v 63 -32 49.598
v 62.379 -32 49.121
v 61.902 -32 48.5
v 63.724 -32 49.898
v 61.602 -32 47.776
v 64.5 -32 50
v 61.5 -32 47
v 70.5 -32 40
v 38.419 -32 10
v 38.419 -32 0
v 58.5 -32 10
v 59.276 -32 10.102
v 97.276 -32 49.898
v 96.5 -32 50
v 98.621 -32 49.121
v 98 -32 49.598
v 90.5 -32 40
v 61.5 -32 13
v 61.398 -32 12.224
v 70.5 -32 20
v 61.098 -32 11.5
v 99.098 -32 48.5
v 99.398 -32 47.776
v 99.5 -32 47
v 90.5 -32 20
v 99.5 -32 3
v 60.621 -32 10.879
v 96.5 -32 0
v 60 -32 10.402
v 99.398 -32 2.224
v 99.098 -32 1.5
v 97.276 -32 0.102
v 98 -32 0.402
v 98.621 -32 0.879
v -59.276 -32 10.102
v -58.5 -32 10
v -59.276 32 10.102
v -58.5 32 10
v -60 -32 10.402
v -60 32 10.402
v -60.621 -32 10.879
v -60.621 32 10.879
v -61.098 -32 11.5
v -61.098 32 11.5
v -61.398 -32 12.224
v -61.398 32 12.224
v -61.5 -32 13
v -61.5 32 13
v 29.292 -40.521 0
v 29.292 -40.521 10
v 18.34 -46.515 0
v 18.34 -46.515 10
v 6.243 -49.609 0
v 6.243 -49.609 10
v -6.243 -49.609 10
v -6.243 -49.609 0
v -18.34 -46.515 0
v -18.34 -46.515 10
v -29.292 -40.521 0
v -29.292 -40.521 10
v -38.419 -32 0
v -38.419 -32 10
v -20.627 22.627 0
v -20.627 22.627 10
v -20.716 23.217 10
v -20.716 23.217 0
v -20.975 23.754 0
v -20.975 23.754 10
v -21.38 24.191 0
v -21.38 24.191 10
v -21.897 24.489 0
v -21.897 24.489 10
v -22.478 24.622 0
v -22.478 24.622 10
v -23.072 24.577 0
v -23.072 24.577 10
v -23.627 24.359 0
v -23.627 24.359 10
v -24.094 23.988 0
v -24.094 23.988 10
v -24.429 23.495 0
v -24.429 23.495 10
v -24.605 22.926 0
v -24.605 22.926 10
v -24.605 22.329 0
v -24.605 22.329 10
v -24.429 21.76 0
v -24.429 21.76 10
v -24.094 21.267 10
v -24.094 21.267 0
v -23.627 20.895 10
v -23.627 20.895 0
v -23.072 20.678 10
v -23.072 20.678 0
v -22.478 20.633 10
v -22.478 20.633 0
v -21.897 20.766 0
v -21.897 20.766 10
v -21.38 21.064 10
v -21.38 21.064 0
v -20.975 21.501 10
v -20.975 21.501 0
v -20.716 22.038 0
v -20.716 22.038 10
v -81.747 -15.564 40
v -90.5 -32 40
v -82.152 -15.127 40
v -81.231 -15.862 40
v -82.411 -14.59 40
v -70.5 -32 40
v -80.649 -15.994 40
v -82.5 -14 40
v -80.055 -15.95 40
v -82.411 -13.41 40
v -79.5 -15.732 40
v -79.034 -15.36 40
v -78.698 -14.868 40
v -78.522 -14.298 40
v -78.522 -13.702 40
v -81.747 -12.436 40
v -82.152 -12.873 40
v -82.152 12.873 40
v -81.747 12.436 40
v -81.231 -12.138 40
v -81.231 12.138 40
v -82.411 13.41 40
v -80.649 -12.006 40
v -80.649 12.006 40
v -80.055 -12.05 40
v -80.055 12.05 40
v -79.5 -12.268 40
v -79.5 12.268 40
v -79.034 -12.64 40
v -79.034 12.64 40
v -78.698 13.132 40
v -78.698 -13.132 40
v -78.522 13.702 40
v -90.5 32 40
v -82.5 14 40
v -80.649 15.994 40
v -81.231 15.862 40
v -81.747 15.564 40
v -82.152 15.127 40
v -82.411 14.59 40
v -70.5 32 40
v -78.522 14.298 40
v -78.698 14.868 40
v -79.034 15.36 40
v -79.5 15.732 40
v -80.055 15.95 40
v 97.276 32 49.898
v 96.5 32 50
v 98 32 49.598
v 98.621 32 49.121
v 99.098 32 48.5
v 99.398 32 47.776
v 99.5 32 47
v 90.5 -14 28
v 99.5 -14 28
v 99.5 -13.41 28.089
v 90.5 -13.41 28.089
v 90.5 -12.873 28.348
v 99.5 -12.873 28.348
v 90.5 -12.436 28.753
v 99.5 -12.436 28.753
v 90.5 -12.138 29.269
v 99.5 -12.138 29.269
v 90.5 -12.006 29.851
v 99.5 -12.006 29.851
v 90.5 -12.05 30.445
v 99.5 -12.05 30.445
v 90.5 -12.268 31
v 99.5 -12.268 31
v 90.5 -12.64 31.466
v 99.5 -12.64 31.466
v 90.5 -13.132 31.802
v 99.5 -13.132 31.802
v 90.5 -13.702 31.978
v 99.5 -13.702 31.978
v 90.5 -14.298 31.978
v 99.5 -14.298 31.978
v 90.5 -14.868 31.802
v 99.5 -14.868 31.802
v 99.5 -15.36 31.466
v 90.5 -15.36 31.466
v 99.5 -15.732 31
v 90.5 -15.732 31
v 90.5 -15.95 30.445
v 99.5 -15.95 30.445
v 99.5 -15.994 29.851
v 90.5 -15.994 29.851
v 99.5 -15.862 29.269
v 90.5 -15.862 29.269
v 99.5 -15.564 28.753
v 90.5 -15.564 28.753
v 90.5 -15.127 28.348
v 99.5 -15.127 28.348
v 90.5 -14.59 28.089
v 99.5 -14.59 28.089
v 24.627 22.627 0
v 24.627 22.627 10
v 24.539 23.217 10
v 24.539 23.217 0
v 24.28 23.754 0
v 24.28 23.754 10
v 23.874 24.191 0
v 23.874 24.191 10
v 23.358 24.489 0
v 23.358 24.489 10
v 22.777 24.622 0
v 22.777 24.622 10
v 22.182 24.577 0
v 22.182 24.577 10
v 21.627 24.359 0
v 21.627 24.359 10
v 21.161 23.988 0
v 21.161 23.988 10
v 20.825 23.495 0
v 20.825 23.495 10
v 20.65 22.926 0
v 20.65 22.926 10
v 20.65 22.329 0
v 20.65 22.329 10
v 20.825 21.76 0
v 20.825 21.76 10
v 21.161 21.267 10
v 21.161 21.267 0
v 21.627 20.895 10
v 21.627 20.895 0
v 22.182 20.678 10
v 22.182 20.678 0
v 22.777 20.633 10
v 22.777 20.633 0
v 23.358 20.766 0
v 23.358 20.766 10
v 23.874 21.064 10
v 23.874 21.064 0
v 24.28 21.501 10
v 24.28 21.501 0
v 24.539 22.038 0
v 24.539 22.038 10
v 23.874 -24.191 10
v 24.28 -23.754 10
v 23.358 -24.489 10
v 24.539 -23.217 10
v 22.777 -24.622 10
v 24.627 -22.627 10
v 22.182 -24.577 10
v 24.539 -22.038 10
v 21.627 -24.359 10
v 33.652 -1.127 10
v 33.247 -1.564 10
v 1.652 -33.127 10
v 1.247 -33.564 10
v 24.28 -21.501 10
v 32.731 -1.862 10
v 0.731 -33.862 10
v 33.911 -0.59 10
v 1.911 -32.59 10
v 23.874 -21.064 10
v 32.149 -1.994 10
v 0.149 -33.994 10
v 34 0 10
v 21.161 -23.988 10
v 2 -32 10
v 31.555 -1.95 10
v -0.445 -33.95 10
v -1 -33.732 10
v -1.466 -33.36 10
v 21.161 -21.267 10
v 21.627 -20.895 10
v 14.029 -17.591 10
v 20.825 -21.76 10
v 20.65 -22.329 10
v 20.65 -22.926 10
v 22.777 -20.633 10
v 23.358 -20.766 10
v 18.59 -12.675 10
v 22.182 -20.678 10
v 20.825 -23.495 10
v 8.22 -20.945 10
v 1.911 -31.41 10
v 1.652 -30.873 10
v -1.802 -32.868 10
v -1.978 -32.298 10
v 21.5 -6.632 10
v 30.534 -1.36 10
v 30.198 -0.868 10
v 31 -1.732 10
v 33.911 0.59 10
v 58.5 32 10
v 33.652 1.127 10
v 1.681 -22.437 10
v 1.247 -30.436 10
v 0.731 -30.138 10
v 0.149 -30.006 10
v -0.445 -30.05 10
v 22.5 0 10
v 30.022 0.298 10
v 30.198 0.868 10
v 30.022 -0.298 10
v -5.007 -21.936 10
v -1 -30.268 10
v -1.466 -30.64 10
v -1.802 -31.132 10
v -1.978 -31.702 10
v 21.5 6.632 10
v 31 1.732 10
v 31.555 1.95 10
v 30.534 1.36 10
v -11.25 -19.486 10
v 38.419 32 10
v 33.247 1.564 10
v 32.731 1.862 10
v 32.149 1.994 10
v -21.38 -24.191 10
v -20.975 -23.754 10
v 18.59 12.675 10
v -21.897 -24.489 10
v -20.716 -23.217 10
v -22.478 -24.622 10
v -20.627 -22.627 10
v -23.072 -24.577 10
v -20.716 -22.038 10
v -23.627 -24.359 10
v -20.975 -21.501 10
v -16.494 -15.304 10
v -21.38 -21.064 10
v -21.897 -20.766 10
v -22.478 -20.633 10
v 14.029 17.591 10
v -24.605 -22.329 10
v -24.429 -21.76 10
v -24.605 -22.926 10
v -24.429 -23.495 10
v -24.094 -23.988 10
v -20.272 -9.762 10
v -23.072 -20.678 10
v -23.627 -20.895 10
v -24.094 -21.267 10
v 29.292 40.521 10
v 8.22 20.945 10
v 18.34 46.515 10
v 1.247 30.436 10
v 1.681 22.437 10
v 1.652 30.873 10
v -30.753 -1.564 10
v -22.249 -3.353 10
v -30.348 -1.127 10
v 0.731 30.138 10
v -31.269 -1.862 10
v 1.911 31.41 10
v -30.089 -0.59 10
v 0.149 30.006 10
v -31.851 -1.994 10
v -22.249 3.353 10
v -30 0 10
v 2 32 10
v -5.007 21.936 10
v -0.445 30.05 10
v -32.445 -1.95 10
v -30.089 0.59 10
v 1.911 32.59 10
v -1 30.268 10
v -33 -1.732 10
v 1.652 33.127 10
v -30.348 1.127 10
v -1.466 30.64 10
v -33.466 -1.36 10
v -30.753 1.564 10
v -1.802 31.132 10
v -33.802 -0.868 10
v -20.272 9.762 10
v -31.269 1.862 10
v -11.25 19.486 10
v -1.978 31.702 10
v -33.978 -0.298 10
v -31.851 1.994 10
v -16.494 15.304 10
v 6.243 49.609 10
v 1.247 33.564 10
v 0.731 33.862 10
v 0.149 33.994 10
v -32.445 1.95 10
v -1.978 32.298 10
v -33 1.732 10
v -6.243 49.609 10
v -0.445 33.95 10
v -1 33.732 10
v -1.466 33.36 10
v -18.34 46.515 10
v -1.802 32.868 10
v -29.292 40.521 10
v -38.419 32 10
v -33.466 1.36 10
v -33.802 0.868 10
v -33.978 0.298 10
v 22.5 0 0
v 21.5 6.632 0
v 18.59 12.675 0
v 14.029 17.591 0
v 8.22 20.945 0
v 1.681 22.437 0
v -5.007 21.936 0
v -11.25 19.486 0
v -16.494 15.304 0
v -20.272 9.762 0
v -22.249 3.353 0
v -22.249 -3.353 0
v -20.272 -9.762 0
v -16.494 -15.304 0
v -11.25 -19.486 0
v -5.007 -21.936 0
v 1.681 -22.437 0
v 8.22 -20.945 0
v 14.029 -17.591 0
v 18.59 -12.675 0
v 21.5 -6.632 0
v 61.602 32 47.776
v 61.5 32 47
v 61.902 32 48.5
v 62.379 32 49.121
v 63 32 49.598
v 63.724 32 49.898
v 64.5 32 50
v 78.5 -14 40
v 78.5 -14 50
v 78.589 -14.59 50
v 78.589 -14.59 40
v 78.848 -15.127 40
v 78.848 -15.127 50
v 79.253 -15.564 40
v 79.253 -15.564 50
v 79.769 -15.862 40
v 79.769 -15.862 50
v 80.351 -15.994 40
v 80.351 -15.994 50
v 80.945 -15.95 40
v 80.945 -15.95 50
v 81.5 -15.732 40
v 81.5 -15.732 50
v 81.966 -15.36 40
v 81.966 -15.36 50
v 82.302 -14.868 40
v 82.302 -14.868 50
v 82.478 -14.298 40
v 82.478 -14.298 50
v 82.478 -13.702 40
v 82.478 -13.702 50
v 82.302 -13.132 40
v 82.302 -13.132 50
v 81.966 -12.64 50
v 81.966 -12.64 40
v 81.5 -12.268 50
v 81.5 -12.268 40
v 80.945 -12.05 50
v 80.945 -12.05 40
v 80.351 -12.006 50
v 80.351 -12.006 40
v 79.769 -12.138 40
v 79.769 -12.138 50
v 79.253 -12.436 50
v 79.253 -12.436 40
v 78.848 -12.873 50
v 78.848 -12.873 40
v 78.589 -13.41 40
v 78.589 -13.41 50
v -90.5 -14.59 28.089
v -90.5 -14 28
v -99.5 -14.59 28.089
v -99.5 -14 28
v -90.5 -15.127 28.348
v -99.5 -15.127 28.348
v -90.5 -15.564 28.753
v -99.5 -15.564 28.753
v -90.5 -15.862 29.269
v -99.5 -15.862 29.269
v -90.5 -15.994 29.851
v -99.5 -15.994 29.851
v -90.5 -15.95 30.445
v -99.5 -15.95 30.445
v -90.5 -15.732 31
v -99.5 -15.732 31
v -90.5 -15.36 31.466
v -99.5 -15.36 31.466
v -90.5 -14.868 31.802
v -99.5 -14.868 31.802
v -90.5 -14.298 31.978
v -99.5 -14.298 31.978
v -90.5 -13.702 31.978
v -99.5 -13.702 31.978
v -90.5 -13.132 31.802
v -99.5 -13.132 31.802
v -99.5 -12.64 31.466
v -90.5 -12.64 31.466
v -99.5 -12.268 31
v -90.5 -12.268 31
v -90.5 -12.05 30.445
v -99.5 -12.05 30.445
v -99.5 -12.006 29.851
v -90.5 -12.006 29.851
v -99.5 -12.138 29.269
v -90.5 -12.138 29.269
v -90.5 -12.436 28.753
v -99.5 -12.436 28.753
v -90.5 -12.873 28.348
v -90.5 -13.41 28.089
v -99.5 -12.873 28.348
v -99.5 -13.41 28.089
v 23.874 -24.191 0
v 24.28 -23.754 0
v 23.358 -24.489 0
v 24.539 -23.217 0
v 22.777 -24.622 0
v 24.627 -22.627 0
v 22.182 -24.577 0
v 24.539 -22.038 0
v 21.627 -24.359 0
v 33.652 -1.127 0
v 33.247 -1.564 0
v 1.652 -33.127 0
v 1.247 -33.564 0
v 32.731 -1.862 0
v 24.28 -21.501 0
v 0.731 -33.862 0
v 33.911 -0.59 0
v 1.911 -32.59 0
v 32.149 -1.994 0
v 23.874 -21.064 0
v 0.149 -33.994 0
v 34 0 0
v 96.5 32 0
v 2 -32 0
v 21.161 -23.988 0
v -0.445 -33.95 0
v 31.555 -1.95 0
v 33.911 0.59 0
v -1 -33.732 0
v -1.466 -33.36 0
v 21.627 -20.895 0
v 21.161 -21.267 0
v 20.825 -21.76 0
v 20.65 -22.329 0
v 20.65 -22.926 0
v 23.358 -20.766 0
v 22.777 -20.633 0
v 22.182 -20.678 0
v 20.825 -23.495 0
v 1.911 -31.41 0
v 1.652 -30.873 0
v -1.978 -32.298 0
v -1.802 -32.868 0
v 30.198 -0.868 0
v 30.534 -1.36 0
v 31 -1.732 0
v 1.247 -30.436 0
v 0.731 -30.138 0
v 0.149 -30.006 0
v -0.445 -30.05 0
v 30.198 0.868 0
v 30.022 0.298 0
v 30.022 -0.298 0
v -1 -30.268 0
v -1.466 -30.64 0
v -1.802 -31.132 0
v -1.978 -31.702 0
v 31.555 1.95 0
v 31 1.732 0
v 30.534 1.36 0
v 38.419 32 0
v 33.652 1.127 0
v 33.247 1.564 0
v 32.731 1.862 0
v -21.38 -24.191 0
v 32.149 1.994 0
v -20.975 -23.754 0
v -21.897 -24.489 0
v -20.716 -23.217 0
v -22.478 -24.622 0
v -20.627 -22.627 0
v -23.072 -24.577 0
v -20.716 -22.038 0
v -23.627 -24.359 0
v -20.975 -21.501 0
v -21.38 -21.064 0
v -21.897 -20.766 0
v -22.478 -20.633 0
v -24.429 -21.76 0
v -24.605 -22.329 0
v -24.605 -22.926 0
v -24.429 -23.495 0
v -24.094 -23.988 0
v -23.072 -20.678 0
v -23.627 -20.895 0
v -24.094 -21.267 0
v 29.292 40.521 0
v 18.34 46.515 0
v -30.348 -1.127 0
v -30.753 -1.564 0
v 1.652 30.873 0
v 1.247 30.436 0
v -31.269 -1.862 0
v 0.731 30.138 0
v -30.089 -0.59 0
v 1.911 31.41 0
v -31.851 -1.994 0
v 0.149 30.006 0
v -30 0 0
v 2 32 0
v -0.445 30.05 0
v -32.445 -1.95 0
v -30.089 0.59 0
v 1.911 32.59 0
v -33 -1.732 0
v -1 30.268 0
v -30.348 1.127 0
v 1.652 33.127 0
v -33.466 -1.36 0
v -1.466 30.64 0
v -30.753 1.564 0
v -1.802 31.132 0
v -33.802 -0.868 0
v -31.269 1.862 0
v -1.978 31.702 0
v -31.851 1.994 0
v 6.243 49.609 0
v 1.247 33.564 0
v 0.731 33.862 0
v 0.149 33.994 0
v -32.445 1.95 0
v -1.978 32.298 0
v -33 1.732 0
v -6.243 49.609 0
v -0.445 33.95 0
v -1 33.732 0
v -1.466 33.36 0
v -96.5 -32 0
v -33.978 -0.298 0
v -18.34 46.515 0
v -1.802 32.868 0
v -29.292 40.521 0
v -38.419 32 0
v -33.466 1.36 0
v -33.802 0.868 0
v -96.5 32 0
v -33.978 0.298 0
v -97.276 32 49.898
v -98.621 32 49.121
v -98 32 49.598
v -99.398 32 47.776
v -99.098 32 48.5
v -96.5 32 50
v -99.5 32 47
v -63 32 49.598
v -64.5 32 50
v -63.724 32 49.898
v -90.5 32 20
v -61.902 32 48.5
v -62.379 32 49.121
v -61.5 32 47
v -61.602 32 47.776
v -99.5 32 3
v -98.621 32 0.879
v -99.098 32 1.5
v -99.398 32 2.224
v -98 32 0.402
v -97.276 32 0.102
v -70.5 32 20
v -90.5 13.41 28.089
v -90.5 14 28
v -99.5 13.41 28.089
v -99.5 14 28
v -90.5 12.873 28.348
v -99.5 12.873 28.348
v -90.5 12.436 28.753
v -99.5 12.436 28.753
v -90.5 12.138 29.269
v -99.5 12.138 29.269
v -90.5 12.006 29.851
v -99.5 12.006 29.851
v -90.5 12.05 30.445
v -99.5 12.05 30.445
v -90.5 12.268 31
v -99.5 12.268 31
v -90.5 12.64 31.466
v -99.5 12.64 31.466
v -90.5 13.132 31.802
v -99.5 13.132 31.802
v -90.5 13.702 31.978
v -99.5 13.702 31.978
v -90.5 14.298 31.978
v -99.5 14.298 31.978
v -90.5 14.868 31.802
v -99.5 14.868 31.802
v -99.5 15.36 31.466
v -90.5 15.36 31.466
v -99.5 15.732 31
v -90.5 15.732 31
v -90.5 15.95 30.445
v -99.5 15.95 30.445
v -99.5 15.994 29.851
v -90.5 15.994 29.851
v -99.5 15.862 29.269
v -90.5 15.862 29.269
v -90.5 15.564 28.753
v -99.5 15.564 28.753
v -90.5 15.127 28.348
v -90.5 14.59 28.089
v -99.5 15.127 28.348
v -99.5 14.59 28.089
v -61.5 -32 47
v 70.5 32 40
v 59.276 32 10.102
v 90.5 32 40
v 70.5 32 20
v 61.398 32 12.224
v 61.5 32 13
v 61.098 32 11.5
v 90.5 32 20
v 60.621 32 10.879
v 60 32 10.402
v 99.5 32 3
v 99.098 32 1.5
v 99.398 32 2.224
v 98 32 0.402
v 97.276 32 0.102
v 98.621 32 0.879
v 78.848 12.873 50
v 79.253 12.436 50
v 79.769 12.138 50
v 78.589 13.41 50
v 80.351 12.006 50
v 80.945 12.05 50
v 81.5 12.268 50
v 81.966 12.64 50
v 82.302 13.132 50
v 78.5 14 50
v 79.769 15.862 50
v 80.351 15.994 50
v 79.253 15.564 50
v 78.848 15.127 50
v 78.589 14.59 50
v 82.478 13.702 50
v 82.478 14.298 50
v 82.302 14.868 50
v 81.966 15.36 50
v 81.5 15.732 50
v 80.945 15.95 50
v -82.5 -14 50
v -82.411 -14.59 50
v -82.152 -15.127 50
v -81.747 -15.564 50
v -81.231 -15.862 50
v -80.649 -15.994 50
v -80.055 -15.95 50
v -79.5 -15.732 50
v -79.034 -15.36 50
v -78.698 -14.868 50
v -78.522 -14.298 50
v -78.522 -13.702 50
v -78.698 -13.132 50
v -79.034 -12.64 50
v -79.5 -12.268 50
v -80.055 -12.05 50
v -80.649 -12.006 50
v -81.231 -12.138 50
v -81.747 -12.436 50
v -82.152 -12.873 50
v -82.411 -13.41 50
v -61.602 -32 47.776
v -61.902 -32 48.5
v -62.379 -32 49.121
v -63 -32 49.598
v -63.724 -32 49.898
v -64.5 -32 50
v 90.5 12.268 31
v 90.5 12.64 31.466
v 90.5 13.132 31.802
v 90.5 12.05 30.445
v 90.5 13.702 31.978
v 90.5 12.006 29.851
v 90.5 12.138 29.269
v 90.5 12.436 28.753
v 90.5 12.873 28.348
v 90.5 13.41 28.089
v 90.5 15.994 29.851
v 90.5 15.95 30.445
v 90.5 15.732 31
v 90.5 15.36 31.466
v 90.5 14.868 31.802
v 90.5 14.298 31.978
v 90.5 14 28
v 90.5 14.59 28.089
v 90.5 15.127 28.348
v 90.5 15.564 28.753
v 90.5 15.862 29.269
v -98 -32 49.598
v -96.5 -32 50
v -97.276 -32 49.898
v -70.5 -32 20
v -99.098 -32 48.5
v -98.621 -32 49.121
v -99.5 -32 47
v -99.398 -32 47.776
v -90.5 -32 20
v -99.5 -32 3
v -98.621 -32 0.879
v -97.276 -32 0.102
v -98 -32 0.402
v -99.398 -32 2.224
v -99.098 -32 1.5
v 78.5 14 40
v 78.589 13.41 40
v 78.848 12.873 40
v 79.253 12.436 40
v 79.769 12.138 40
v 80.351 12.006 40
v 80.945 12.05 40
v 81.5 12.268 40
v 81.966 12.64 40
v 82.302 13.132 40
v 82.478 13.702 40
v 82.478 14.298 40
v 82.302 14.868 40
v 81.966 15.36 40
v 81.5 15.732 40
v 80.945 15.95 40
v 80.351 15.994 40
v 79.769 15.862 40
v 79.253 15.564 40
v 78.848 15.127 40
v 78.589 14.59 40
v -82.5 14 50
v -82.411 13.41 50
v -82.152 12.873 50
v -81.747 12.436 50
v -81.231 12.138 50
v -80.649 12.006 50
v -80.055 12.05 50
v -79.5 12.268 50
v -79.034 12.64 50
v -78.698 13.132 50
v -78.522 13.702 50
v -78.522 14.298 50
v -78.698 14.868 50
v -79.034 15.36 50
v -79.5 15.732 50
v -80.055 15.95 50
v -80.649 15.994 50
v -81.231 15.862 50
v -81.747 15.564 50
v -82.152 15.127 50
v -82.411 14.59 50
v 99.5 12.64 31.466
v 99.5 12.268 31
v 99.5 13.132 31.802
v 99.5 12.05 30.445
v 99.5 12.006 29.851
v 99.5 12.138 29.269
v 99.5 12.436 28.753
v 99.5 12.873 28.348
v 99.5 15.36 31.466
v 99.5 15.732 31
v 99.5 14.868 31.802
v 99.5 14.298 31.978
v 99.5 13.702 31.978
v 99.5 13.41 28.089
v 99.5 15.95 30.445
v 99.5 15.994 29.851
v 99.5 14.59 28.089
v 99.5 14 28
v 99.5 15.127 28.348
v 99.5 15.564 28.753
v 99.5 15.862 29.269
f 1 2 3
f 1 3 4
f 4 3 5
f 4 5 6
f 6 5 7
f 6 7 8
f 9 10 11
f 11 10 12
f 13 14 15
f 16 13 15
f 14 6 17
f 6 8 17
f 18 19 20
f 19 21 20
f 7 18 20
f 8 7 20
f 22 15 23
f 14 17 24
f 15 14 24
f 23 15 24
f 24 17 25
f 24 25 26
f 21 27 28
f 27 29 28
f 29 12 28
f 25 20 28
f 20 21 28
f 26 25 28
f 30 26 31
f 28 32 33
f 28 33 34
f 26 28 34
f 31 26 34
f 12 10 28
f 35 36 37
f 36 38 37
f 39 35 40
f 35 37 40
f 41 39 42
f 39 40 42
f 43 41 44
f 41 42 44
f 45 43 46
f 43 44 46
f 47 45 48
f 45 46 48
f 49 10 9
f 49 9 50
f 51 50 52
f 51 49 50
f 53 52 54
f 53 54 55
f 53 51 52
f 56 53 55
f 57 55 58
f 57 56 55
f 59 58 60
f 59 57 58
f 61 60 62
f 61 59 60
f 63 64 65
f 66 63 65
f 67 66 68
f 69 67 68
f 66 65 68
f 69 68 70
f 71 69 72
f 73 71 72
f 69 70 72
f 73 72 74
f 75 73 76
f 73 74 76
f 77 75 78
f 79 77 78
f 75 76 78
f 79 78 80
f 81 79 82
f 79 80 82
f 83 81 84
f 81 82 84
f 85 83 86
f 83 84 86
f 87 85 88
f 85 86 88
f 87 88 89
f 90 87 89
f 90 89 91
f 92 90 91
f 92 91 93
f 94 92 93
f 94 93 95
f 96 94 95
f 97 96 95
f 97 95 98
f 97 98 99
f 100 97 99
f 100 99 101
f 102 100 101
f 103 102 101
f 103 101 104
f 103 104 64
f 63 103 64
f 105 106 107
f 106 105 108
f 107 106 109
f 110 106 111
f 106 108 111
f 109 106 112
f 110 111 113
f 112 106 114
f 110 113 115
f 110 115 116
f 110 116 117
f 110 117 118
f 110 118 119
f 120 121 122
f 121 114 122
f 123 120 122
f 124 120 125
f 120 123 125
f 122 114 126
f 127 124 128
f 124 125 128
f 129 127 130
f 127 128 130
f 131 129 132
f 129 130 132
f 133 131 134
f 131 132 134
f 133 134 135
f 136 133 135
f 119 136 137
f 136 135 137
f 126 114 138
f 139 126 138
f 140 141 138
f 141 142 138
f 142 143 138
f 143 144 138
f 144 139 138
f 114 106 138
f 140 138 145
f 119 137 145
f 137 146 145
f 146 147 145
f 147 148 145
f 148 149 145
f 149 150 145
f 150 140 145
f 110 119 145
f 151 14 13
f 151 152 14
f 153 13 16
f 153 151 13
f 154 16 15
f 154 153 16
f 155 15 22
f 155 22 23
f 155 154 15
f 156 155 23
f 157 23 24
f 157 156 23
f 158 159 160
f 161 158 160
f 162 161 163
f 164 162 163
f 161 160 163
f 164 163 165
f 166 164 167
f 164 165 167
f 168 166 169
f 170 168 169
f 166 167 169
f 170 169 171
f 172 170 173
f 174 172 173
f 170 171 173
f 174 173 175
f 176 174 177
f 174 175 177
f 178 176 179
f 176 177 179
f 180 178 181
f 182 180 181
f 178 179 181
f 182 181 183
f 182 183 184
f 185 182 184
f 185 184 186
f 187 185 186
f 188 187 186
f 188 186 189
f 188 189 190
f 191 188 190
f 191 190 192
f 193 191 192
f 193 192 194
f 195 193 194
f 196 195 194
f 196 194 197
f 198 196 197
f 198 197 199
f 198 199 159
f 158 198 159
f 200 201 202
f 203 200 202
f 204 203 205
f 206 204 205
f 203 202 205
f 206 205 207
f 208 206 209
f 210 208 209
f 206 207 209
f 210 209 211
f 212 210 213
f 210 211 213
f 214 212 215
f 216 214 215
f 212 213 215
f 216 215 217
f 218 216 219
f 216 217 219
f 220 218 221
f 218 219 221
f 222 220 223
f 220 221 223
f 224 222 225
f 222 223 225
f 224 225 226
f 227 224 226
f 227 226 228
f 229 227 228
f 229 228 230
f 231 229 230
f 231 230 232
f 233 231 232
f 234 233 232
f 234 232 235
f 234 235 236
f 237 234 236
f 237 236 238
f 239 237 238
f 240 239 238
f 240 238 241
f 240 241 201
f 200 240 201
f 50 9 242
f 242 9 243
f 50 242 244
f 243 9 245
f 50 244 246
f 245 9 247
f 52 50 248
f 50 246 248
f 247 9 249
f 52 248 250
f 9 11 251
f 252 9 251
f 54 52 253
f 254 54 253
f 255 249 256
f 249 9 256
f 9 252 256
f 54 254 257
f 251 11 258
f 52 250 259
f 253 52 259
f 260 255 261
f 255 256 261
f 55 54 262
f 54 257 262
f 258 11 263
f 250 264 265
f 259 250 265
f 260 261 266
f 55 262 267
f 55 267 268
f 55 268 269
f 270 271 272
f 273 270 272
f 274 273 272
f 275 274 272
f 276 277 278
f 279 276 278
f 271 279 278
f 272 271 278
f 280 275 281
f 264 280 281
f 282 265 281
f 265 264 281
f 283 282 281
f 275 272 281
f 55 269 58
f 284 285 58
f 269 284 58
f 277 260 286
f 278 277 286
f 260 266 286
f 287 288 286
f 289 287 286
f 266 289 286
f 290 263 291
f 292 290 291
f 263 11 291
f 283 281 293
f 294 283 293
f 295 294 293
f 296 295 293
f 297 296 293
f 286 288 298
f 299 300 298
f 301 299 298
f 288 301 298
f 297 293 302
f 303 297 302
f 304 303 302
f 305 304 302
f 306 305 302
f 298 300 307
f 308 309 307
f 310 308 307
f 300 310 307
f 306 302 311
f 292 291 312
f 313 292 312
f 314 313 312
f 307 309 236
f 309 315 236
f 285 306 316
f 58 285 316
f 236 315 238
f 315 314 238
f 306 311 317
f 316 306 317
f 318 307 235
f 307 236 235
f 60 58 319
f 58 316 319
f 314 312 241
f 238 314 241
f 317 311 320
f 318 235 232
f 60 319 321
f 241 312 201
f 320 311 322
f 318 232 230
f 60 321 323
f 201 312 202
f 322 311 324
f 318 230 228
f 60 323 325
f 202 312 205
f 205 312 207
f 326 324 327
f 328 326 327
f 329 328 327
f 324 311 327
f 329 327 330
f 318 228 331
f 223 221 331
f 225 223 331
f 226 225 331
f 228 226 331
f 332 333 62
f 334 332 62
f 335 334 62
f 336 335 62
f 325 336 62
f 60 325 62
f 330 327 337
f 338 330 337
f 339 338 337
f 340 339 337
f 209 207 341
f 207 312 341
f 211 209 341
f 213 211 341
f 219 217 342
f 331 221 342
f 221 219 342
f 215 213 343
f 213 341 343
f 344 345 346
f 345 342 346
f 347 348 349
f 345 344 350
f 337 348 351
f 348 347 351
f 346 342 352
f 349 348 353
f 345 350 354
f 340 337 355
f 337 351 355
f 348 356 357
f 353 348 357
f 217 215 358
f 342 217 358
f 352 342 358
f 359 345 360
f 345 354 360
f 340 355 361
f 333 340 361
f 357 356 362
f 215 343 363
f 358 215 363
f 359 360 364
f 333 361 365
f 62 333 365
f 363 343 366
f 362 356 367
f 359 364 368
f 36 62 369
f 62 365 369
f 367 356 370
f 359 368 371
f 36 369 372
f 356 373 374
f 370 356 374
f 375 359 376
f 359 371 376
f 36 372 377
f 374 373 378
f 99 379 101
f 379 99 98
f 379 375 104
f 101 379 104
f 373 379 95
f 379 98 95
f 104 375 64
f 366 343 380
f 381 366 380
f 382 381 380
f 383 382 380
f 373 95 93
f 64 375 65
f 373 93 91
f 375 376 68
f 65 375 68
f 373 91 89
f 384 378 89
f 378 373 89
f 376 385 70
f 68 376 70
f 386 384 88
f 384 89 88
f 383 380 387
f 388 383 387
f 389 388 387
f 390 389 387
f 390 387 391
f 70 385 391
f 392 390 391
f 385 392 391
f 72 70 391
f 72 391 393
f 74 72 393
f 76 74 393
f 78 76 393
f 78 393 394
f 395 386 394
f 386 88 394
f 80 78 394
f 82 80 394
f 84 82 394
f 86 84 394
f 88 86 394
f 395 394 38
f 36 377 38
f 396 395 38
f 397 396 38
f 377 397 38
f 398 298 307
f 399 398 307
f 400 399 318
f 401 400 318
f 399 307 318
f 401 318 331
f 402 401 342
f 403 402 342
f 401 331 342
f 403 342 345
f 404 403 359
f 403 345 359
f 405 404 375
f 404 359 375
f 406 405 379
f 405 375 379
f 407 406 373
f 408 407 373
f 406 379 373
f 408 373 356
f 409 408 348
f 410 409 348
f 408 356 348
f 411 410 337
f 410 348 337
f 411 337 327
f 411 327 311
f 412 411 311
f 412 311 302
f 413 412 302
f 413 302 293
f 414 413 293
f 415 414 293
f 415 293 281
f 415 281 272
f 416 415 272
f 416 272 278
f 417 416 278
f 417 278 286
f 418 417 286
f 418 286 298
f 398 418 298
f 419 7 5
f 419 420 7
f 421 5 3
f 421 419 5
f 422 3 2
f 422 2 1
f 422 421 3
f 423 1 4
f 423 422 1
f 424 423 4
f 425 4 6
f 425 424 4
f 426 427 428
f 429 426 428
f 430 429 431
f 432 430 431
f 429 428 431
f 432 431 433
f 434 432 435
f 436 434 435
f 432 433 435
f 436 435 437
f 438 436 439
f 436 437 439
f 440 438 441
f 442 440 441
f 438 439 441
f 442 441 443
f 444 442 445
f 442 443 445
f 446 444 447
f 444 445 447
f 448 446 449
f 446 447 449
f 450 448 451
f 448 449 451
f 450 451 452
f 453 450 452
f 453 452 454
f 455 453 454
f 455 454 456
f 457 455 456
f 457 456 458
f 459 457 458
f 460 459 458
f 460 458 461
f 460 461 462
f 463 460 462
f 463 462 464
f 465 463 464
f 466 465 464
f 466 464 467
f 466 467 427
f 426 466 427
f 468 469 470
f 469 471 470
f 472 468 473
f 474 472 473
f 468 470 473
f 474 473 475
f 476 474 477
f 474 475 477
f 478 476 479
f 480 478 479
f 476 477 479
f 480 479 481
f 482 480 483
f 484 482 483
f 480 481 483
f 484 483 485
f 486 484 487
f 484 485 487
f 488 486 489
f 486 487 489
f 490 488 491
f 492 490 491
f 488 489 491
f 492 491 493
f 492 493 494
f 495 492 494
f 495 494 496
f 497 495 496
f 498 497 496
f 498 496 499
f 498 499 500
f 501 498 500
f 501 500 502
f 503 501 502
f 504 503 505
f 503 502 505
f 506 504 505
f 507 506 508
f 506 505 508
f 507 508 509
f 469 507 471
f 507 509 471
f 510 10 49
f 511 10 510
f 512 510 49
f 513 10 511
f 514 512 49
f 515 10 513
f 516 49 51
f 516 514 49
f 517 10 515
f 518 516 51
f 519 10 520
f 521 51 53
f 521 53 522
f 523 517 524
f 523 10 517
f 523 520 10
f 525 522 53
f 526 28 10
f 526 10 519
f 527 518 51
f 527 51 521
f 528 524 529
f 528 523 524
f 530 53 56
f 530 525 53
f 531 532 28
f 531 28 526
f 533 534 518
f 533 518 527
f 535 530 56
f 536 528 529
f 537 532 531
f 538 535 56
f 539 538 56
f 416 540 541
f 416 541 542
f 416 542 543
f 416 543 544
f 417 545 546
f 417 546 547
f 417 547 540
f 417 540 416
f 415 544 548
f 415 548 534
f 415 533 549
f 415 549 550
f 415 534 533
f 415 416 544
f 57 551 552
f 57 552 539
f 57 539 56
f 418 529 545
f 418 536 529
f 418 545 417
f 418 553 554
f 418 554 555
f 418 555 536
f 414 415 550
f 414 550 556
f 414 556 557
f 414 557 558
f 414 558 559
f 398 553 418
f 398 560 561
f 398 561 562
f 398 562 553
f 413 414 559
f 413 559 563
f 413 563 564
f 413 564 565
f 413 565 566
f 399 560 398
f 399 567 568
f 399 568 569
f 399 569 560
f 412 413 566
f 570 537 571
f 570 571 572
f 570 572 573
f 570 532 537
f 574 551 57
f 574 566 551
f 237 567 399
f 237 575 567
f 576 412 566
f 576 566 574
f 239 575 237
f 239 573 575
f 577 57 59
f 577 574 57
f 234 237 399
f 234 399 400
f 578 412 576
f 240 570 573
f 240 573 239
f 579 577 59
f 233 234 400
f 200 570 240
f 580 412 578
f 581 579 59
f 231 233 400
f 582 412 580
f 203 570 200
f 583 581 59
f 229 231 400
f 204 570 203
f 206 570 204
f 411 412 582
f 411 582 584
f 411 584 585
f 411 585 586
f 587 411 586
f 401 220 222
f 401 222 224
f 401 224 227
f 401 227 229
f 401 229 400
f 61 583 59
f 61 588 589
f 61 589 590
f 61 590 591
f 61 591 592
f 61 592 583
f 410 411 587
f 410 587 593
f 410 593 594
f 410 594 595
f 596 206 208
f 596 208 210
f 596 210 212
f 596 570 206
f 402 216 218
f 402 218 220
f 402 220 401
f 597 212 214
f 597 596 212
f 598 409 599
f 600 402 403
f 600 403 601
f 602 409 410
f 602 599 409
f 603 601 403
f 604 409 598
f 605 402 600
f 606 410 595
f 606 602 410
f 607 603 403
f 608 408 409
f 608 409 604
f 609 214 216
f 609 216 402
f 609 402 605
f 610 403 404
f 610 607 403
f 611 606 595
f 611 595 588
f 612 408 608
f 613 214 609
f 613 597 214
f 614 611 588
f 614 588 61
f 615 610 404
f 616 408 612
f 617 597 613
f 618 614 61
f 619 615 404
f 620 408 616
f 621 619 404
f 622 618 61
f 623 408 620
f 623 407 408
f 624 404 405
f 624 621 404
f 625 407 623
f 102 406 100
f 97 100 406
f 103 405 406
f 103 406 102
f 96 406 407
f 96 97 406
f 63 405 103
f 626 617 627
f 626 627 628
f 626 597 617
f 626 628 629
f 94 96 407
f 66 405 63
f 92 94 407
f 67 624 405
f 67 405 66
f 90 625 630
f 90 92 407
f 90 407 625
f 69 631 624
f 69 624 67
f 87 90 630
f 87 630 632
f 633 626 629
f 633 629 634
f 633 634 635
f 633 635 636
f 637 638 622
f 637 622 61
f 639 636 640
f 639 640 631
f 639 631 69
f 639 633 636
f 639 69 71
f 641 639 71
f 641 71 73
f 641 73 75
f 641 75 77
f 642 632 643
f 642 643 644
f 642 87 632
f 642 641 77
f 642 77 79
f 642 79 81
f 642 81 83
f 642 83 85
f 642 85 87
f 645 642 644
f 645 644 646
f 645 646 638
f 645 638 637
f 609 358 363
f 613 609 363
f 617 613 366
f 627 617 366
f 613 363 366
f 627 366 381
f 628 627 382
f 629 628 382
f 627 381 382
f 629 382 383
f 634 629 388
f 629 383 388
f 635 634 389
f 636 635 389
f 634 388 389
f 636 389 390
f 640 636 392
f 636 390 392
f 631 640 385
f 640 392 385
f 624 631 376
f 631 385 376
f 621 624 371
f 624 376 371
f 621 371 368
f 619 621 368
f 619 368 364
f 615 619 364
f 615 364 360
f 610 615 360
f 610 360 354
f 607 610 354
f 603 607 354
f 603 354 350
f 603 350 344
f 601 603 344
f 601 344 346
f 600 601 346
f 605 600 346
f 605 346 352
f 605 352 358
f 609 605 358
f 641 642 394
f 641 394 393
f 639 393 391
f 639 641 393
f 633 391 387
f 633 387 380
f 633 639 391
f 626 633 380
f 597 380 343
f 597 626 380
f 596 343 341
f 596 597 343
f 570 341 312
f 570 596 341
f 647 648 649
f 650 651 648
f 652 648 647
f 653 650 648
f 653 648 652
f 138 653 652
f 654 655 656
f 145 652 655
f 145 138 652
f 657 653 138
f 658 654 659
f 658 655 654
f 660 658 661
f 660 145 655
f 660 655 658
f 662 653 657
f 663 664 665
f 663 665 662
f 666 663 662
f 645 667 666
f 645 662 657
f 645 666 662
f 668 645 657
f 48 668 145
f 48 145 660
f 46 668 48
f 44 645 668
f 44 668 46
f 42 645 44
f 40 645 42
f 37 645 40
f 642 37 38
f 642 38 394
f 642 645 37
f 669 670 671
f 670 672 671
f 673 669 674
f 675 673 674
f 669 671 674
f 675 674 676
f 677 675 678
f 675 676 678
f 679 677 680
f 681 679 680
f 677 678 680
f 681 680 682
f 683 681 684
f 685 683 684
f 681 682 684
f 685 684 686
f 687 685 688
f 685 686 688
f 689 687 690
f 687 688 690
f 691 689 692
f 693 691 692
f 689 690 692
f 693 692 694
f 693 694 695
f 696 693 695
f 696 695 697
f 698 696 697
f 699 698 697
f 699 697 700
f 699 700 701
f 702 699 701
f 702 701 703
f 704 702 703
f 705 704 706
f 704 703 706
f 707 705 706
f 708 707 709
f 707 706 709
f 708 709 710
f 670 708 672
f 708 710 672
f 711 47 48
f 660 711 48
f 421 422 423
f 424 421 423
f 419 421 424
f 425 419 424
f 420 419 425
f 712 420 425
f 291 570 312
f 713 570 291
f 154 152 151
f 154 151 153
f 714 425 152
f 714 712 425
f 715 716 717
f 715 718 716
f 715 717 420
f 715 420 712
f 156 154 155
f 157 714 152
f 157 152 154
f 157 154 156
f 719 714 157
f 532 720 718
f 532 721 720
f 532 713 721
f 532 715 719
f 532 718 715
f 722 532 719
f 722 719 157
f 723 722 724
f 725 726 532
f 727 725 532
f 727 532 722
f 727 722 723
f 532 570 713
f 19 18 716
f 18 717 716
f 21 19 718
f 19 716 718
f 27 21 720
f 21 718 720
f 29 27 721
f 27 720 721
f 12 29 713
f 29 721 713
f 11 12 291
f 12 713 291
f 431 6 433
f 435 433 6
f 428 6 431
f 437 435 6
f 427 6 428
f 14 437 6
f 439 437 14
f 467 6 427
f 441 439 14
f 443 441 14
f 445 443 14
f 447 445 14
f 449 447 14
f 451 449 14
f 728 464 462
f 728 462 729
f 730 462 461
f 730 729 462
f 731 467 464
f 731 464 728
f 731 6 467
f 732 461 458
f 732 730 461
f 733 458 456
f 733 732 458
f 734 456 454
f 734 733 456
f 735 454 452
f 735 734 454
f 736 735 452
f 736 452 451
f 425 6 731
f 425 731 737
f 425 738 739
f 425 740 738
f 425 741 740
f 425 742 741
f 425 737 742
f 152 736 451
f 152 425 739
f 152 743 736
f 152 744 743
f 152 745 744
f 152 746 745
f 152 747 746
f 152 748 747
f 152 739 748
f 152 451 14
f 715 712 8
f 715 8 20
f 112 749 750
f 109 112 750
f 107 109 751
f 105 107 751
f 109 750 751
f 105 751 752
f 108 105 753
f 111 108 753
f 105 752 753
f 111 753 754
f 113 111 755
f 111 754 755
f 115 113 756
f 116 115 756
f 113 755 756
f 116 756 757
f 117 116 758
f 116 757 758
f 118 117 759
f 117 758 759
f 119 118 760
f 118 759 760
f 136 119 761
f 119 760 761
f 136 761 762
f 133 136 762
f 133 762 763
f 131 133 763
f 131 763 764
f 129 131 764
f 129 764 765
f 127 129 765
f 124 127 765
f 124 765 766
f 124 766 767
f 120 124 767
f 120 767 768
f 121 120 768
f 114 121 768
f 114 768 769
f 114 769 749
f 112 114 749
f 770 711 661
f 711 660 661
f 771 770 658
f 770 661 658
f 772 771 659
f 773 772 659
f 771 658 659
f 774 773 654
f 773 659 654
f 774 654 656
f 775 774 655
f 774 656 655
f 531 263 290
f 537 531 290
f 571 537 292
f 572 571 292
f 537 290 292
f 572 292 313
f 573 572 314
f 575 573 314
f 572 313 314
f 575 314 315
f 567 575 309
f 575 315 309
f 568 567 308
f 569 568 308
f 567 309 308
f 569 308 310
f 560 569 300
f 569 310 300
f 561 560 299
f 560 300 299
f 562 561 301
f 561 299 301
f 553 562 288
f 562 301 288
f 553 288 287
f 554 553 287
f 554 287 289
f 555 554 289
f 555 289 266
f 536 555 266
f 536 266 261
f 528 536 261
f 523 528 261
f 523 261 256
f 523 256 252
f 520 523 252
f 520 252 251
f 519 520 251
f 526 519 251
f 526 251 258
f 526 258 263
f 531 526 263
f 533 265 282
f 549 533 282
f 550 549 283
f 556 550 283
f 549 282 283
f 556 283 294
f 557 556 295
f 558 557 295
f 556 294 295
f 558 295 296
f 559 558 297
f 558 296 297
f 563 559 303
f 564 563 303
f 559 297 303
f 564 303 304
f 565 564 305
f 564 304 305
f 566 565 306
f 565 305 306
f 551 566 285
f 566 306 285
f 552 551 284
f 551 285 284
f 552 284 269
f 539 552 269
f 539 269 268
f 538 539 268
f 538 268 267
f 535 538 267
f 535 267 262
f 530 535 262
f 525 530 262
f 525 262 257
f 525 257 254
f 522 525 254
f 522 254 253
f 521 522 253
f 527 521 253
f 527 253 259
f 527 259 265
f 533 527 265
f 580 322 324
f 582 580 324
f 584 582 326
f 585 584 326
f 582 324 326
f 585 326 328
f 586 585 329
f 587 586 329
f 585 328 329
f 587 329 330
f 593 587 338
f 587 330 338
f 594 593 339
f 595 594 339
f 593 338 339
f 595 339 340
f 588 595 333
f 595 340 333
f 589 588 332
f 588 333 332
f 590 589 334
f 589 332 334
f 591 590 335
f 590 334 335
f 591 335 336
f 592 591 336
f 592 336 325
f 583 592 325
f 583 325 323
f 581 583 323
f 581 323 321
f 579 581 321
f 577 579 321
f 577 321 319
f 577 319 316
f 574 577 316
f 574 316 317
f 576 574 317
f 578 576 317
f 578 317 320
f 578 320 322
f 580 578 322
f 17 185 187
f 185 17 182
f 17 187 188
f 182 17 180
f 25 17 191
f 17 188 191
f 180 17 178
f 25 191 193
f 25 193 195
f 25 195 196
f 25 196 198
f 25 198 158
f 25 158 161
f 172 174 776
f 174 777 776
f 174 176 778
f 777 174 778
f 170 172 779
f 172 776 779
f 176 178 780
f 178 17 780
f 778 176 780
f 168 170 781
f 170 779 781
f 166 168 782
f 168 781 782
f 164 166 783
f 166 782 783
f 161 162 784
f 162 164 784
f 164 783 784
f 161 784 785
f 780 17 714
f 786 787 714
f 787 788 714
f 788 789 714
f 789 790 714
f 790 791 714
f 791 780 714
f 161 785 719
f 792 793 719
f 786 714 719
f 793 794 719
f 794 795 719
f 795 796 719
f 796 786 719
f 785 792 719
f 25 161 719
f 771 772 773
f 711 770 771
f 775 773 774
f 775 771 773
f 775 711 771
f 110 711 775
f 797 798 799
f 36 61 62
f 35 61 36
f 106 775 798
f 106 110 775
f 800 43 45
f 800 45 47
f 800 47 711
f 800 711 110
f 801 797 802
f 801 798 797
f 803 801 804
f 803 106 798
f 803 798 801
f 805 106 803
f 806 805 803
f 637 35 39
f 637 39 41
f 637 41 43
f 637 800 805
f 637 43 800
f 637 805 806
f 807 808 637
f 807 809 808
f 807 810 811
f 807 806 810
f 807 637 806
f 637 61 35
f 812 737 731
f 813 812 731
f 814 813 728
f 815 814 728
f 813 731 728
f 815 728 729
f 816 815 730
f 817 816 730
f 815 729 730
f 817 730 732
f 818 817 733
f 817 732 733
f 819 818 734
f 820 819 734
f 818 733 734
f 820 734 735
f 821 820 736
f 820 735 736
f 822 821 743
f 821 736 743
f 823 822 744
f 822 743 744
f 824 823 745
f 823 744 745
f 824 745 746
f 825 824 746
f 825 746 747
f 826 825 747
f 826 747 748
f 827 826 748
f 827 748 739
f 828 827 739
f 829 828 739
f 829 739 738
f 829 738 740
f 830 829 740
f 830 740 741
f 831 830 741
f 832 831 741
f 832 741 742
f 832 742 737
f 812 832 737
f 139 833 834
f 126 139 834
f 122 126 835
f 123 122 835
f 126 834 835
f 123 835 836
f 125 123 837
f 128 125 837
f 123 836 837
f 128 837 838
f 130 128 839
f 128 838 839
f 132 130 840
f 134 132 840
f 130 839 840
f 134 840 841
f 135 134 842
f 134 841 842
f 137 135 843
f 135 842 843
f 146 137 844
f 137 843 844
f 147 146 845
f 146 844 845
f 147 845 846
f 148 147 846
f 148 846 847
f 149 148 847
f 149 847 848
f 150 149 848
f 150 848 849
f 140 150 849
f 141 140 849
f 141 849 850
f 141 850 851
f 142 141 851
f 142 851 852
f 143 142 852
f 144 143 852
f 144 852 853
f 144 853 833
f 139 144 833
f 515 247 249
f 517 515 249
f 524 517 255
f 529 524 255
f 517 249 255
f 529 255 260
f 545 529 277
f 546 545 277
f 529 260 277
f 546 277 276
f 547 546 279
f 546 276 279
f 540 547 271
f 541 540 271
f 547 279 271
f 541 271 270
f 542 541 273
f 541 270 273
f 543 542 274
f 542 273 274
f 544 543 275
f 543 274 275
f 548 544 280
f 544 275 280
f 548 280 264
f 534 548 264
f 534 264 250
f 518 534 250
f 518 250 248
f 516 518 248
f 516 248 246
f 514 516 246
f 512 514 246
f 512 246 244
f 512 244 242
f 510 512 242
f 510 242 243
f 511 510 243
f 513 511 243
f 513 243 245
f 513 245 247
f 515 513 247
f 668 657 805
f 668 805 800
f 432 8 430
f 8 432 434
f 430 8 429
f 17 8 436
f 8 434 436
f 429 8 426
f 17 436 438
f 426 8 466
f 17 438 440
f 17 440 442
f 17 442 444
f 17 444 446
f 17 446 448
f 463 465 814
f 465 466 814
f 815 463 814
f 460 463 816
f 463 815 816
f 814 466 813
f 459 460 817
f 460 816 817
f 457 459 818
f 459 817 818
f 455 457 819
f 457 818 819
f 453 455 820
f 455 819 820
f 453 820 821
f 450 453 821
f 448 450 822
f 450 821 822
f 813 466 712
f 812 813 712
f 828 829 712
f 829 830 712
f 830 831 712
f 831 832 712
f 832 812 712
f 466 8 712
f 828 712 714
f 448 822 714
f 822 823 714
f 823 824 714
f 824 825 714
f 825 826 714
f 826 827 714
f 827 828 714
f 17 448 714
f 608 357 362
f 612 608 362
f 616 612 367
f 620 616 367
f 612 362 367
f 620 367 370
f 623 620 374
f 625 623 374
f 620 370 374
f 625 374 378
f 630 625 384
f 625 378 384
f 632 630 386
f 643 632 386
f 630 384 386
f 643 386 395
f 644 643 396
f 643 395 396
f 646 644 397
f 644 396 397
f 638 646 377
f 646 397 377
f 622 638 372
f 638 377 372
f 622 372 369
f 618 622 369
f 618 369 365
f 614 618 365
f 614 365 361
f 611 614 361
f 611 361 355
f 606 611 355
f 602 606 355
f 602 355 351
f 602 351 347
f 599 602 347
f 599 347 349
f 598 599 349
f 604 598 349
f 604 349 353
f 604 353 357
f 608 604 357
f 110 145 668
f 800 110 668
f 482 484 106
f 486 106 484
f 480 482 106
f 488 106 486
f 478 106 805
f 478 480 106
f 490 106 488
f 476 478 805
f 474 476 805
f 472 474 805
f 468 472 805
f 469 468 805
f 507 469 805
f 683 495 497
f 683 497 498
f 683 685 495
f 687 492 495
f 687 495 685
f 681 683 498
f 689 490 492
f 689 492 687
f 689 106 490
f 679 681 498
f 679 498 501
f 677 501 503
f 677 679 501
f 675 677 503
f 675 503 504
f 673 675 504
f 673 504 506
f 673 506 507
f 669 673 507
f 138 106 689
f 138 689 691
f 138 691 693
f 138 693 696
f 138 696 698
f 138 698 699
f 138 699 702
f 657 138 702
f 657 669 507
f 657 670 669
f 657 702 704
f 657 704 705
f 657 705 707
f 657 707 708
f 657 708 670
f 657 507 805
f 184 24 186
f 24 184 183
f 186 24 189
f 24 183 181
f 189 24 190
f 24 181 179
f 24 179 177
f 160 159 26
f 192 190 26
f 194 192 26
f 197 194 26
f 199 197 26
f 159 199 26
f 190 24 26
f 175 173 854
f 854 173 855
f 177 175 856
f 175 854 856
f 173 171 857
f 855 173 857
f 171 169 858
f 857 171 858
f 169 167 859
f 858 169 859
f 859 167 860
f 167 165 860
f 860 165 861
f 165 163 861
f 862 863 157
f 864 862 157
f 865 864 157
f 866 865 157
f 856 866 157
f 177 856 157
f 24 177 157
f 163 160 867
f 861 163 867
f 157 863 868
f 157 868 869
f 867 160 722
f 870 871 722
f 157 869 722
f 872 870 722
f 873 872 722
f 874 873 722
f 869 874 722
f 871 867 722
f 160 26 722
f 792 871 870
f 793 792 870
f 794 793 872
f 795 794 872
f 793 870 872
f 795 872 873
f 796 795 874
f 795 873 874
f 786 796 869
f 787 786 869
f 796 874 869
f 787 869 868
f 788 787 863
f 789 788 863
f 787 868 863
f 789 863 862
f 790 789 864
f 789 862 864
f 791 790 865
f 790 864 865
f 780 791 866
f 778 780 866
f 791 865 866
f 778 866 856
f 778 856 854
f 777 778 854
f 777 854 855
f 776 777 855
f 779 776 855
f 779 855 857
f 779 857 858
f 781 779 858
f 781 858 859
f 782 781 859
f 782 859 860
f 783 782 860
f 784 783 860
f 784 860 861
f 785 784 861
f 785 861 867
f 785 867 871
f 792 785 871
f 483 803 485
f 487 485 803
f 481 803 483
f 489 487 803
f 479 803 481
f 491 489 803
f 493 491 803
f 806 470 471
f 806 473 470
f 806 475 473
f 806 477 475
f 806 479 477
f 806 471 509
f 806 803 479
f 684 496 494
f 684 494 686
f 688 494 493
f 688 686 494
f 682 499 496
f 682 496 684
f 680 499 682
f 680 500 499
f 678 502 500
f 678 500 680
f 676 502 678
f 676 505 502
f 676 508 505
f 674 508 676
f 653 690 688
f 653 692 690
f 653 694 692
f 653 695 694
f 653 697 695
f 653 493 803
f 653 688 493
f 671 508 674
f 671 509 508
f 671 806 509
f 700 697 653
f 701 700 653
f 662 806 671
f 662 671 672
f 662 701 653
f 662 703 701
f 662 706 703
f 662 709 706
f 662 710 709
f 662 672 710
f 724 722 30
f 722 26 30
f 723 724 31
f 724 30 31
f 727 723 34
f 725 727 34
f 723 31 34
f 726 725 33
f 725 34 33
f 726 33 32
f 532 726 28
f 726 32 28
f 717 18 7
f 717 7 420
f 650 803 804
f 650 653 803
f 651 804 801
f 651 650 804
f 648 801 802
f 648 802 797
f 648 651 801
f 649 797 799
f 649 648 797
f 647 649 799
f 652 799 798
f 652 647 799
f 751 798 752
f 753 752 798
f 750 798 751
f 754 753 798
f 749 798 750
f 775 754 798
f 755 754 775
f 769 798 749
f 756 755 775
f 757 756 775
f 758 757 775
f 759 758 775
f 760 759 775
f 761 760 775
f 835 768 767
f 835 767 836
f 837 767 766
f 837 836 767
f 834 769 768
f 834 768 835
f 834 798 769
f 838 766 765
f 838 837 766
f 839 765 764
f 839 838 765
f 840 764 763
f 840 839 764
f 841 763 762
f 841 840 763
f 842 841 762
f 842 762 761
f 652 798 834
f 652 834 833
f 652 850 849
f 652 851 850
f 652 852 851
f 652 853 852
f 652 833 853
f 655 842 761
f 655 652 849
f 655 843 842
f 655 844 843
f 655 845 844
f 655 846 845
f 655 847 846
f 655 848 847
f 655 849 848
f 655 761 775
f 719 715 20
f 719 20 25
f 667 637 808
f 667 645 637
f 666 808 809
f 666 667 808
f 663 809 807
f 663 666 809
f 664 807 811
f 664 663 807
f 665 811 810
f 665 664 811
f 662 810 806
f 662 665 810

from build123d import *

# Parameters (mm, degrees)
BOSS_EXTRUDE1_DEPTH            = 10
SKETCH2_R                      = 22.5
CUT_EXTRUDE1_DEPTH             = 112.804516903
SKETCH3_R                      = 2
CUT_EXTRUDE2_DEPTH             = 112.804516903
SKETCH5_W                      = 38
SKETCH5_H                      = 64
BOSS_EXTRUDE2_DEPTH            = 40
SKETCH6_W                      = 20
SKETCH6_H                      = 20
CUT_EXTRUDE3_DEPTH             = 139.290455202
CUT_EXTRUDE4_REACH             = 124.067
SKETCH8_R                      = 2
CUT_EXTRUDE4_DIRECTION_2_DEPTH = 123.066580193
CUT_EXTRUDE5_REACH             = 213.189
SKETCH9_R                      = 2
CUT_EXTRUDE6_REACH             = 213.189
SKETCH10_R                     = 2
FILLET1_R                      = 3
FILLET2_R                      = 3
FILLET3_R                      = 3


with BuildPart() as part:
    # Sketch1 → Boss-Extrude1 (new body)
    with BuildSketch(Plane.XY):
        with BuildLine():
            Line((38.418745425, 32), (99.5, 32))
            Line((99.5, 32), (99.5, -32))
            Line((99.5, -32), (38.418745425, -32))
            ThreePointArc((38.418745425, -32), (0, -50), (-38.418745425, -32))
            Line((-38.418745425, -32), (-99.5, -32))
            Line((-99.5, -32), (-99.5, 32))
            Line((-99.5, 32), (-38.418745425, 32))
            ThreePointArc((-38.418745425, 32), (0, 50), (38.418745425, 32))
        make_face()
    extrude(amount=BOSS_EXTRUDE1_DEPTH)

    # Sketch2 → Cut-Extrude1 (cut, through all)
    with BuildSketch(Plane.XY.offset(10)):
        Circle(SKETCH2_R)
    extrude(amount=-CUT_EXTRUDE1_DEPTH, mode=Mode.SUBTRACT)

    # Sketch3 → Cut-Extrude2 (cut, through all)
    with BuildSketch(Plane.XY.offset(10)):
        with Locations((32, 0)):
            Circle(SKETCH3_R)
        with Locations((22.627416998, -22.627416998)):
            Circle(SKETCH3_R)
        with Locations((0, -32)):
            Circle(SKETCH3_R)
        with Locations((-22.627416998, -22.627416998)):
            Circle(SKETCH3_R)
        with Locations((-32, 0)):
            Circle(SKETCH3_R)
        with Locations((-22.627416998, 22.627416998)):
            Circle(SKETCH3_R)
        with Locations((0, 32)):
            Circle(SKETCH3_R)
        with Locations((22.627416998, 22.627416998)):
            Circle(SKETCH3_R)
    extrude(amount=-CUT_EXTRUDE2_DEPTH, mode=Mode.SUBTRACT)

    # Sketch5 → Boss-Extrude2 (add)
    with BuildSketch(Plane.XY.offset(10)):
        with Locations((80.5, 0)):
            Rectangle(SKETCH5_W, SKETCH5_H)
        with Locations((-80.5, 0)):
            Rectangle(SKETCH5_W, SKETCH5_H)
    extrude(amount=BOSS_EXTRUDE2_DEPTH)

    # Sketch6 → Cut-Extrude3 (cut, through all)
    with BuildSketch(Plane(origin=(0, 32, 0), x_dir=(1, 0, 0), z_dir=(0, 1, 0))):
        with Locations((80.5, -30)):
            Rectangle(SKETCH6_W, SKETCH6_H)
        with Locations((-80.5, -30)):
            Rectangle(SKETCH6_W, SKETCH6_H)
    extrude(amount=-CUT_EXTRUDE3_DEPTH, mode=Mode.SUBTRACT)

    # Sketch8 → Cut-Extrude4 (cut, up to next)
    with BuildSketch(Plane.XY.offset(50), mode=Mode.PRIVATE) as cut_extrude4_sk1:
        with Locations(Location((80.5, 14, 0), (0, 0, 180))):
            Circle(SKETCH8_R)
    cut_extrude4_tool1 = extrude(cut_extrude4_sk1.sketch, amount=-CUT_EXTRUDE4_REACH, mode=Mode.PRIVATE) & part.part
    # Sketch8 → Cut-Extrude4 (cut, up to next)
    with BuildSketch(Plane.XY.offset(50), mode=Mode.PRIVATE) as cut_extrude4_sk2:
        with Locations(Location((80.5, -14, 0), (0, 0, 180))):
            Circle(SKETCH8_R)
    cut_extrude4_tool2 = extrude(cut_extrude4_sk2.sketch, amount=-CUT_EXTRUDE4_REACH, mode=Mode.PRIVATE) & part.part
    # Sketch8 → Cut-Extrude4 (cut, up to next)
    with BuildSketch(Plane.XY.offset(50), mode=Mode.PRIVATE) as cut_extrude4_sk3:
        with Locations(Location((-80.5, -14, 0), (0, 0, 180))):
            Circle(SKETCH8_R)
    cut_extrude4_tool3 = extrude(cut_extrude4_sk3.sketch, amount=-CUT_EXTRUDE4_REACH, mode=Mode.PRIVATE) & part.part
    # Sketch8 → Cut-Extrude4 (cut, up to next)
    with BuildSketch(Plane.XY.offset(50), mode=Mode.PRIVATE) as cut_extrude4_sk4:
        with Locations(Location((-80.5, 14, 0), (0, 0, 180))):
            Circle(SKETCH8_R)
    cut_extrude4_tool4 = extrude(cut_extrude4_sk4.sketch, amount=-CUT_EXTRUDE4_REACH, mode=Mode.PRIVATE) & part.part
    add(cut_extrude4_tool1.solids().sort_by_distance((80.5, 14, 50))[0], mode=Mode.SUBTRACT)
    add(cut_extrude4_tool2.solids().sort_by_distance((80.5, -14, 50))[0], mode=Mode.SUBTRACT)
    add(cut_extrude4_tool3.solids().sort_by_distance((-80.5, -14, 50))[0], mode=Mode.SUBTRACT)
    add(cut_extrude4_tool4.solids().sort_by_distance((-80.5, 14, 50))[0], mode=Mode.SUBTRACT)

    # Sketch8 → Cut-Extrude4 direction 2 (cut)
    with BuildSketch(Plane.XY.offset(50)):
        with Locations(Location((80.5, 14, 0), (0, 0, 180))):
            Circle(SKETCH8_R)
        with Locations(Location((80.5, -14, 0), (0, 0, 180))):
            Circle(SKETCH8_R)
        with Locations(Location((-80.5, -14, 0), (0, 0, 180))):
            Circle(SKETCH8_R)
        with Locations(Location((-80.5, 14, 0), (0, 0, 180))):
            Circle(SKETCH8_R)
    extrude(amount=CUT_EXTRUDE4_DIRECTION_2_DEPTH, mode=Mode.SUBTRACT)

    # Sketch9 → Cut-Extrude5 (cut, up to next)
    with BuildSketch(Plane(origin=(99.5, 0, 0), x_dir=(0, 0, -1), z_dir=(1, 0, 0)), mode=Mode.PRIVATE) as cut_extrude5_sk1:
        with Locations((-30, 14)):
            Circle(SKETCH9_R)
    cut_extrude5_tool1 = extrude(cut_extrude5_sk1.sketch, amount=-CUT_EXTRUDE5_REACH, mode=Mode.PRIVATE) & part.part
    # Sketch9 → Cut-Extrude5 (cut, up to next)
    with BuildSketch(Plane(origin=(99.5, 0, 0), x_dir=(0, 0, -1), z_dir=(1, 0, 0)), mode=Mode.PRIVATE) as cut_extrude5_sk2:
        with Locations((-30, -14)):
            Circle(SKETCH9_R)
    cut_extrude5_tool2 = extrude(cut_extrude5_sk2.sketch, amount=-CUT_EXTRUDE5_REACH, mode=Mode.PRIVATE) & part.part
    add(cut_extrude5_tool1.solids().sort_by_distance((99.5, 14, 30))[0], mode=Mode.SUBTRACT)
    add(cut_extrude5_tool2.solids().sort_by_distance((99.5, -14, 30))[0], mode=Mode.SUBTRACT)

    # Sketch10 → Cut-Extrude6 (cut, up to next)
    with BuildSketch(Plane.ZY.offset(99.5), mode=Mode.PRIVATE) as cut_extrude6_sk1:
        with Locations(Location((30, 14, 0), (0, 0, 180))):
            Circle(SKETCH10_R)
    cut_extrude6_tool1 = extrude(cut_extrude6_sk1.sketch, amount=-CUT_EXTRUDE6_REACH, mode=Mode.PRIVATE) & part.part
    # Sketch10 → Cut-Extrude6 (cut, up to next)
    with BuildSketch(Plane.ZY.offset(99.5), mode=Mode.PRIVATE) as cut_extrude6_sk2:
        with Locations(Location((30, -14, 0), (0, 0, 180))):
            Circle(SKETCH10_R)
    cut_extrude6_tool2 = extrude(cut_extrude6_sk2.sketch, amount=-CUT_EXTRUDE6_REACH, mode=Mode.PRIVATE) & part.part
    add(cut_extrude6_tool1.solids().sort_by_distance((-99.5, 14, 30))[0], mode=Mode.SUBTRACT)
    add(cut_extrude6_tool2.solids().sort_by_distance((-99.5, -14, 30))[0], mode=Mode.SUBTRACT)

    # Fillet1
    fillet1_edges = [part.edges().sort_by_distance(p)[0] for p in [
        (61.5, 0, 10),
        (-61.5, 0, 10),
    ]]
    fillet(fillet1_edges, radius=FILLET1_R)

    # Fillet2
    fillet2_edges = [part.edges().sort_by_distance(p)[0] for p in [
        (99.5, 0, 50),
        (61.5, 0, 50),
        (-61.5, 0, 50),
        (-99.5, 0, 50),
    ]]
    fillet(fillet2_edges, radius=FILLET2_R)

    # Fillet3
    fillet3_edges = [part.edges().sort_by_distance(p)[0] for p in [
        (99.5, 0, 0),
        (-99.5, 0, 0),
    ]]
    fillet(fillet3_edges, radius=FILLET3_R)


solid = part.part
